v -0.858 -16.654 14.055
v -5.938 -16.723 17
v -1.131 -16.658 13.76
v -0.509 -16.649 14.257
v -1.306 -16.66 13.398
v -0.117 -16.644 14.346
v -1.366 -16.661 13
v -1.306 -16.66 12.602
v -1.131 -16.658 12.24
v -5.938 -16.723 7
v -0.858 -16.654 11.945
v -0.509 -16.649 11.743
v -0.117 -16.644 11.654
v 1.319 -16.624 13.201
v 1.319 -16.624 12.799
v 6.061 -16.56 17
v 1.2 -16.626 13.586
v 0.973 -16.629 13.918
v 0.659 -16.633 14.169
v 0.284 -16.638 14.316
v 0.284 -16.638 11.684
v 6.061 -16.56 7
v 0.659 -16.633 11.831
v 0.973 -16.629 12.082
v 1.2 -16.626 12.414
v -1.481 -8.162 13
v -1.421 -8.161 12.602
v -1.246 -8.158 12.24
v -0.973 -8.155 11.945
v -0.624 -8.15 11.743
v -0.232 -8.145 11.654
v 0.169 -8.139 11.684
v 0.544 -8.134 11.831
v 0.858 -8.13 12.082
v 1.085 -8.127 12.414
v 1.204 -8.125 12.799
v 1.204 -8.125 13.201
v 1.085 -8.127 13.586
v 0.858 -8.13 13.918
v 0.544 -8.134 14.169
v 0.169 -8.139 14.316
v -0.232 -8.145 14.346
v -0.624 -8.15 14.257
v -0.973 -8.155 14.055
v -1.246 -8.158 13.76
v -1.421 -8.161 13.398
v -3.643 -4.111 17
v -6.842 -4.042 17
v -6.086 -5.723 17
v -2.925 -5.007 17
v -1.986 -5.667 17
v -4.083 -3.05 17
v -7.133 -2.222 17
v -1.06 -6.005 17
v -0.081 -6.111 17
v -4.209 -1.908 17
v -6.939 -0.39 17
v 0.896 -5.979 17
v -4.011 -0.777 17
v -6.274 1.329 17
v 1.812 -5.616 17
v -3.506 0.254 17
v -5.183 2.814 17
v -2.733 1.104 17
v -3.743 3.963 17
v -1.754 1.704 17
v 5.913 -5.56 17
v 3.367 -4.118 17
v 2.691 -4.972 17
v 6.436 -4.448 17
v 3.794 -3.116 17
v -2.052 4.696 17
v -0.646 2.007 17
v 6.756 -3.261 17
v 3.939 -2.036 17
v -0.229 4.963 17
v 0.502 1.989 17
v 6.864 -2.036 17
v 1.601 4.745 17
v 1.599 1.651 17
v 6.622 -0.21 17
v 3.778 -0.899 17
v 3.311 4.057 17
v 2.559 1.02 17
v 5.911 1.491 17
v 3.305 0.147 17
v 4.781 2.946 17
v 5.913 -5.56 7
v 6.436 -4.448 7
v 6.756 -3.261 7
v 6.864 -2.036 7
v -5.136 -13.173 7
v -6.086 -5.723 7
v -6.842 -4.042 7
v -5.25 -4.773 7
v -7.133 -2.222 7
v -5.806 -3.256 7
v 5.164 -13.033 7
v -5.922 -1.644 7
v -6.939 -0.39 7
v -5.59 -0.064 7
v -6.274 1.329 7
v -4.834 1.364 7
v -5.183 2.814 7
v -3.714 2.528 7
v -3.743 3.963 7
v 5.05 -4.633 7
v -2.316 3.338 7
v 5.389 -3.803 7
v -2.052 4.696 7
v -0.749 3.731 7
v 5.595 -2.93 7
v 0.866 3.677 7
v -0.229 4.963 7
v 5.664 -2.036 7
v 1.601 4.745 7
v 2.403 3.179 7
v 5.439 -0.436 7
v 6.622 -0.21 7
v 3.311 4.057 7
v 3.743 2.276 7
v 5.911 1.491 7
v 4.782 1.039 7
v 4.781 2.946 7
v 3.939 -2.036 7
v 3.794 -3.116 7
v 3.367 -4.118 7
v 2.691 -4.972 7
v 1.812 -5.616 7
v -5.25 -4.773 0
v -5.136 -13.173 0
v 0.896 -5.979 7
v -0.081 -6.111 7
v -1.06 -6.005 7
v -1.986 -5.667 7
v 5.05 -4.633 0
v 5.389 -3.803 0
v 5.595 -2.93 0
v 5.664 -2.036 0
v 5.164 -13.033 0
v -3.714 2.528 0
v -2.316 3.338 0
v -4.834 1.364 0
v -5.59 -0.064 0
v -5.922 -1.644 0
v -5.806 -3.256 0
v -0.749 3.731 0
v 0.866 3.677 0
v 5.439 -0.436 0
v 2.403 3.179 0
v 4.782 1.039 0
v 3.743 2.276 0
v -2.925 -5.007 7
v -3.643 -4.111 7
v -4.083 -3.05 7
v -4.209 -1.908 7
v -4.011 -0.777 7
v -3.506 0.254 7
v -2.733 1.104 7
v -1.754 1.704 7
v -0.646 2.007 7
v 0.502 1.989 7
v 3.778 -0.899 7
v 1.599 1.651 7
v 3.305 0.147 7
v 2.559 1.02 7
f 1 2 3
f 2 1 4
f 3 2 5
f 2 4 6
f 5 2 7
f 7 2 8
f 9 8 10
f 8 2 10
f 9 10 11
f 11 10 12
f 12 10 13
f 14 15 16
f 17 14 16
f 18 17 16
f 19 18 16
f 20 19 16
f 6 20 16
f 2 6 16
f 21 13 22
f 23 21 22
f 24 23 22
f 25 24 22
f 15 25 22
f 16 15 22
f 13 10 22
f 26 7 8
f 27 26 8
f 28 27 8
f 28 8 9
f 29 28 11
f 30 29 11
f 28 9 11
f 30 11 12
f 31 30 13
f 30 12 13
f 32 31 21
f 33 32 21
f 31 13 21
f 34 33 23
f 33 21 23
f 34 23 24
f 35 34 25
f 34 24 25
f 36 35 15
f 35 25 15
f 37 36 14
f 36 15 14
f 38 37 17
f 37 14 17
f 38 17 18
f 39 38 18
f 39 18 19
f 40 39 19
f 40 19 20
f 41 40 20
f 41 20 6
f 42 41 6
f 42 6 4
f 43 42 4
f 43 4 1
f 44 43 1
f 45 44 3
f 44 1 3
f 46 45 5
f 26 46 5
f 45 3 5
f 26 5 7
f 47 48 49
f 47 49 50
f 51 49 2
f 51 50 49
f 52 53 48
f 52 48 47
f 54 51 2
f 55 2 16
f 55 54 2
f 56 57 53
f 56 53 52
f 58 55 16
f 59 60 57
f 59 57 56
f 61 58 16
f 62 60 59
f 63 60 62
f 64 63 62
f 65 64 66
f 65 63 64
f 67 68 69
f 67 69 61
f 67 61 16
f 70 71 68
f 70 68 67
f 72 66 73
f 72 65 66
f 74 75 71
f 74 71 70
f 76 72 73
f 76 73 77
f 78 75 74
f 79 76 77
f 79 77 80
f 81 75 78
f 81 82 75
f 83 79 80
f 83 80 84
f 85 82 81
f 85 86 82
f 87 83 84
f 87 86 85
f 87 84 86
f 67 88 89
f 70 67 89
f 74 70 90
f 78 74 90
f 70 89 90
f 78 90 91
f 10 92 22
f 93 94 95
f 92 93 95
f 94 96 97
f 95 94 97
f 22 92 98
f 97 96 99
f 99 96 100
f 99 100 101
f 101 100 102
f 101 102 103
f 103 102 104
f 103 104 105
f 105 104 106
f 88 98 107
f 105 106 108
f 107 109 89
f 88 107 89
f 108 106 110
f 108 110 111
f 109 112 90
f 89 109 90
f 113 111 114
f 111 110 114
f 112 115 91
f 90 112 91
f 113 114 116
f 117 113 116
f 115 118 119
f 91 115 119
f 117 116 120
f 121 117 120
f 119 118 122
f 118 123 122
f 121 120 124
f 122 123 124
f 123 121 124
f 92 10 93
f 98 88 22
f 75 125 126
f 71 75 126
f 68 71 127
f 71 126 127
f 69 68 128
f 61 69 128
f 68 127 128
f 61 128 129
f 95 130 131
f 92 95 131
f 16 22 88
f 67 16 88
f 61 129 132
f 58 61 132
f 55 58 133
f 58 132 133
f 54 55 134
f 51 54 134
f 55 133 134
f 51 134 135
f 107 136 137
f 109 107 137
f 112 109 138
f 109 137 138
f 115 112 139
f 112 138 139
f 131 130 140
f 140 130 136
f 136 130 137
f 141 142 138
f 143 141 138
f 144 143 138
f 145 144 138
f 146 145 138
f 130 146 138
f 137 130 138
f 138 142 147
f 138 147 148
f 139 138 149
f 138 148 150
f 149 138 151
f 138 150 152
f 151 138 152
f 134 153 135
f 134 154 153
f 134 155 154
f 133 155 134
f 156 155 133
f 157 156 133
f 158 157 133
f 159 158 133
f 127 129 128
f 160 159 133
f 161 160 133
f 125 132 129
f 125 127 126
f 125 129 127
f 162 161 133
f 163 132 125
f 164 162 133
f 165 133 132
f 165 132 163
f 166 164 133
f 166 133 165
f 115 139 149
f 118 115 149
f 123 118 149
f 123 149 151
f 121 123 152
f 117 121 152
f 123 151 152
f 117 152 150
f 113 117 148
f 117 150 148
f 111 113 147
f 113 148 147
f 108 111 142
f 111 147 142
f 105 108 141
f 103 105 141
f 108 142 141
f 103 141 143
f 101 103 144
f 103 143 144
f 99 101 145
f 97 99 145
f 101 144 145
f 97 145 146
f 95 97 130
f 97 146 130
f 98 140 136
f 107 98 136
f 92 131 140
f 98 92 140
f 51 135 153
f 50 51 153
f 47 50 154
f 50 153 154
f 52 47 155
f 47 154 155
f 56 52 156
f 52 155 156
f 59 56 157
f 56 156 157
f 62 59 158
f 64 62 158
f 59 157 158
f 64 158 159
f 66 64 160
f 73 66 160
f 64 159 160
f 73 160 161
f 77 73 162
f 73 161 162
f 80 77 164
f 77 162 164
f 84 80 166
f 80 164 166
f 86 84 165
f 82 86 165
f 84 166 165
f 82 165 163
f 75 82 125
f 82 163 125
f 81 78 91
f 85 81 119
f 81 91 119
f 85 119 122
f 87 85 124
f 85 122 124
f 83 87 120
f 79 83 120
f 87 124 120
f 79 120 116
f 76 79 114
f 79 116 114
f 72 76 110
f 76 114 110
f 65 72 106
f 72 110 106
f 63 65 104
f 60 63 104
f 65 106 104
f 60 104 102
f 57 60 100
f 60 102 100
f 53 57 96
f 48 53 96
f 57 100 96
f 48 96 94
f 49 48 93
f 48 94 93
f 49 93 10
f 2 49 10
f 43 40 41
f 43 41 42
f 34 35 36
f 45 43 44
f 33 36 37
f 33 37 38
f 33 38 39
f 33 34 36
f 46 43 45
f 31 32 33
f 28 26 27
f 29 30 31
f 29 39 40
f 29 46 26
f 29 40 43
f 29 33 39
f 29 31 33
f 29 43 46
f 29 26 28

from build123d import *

# Parameters (mm, degrees)
BOSS_EXTRUDE1_DEPTH = 7
BOSS_EXTRUDE3_DEPTH = 10
SKETCH6_R           = 1.35
CUT_EXTRUDE3_DEPTH  = 8.5


with BuildPart() as part:
    # Sketch1 → Boss-Extrude1 (new body)
    with BuildSketch(Plane.XY):
        with BuildLine():
            ThreePointArc((5.050452833, -4.633288902), (-0.057176836, -7.835700867), (-5.249547167, -4.77259565))
            Line((-5.249547167, -4.77259565), (-5.135937781, -13.17259565))
            Line((-5.135937781, -13.17259565), (5.164062219, -13.033288902))
            Line((5.164062219, -13.033288902), (5.050452833, -4.633288902))
        make_face()
        with BuildLine():
            ThreePointArc((5.664385761, -2.036231273), (-1.546144107, 3.589638037), (-5.249547167, -4.77259565))
            Line((-5.249547167, -4.77259565), (5.050452833, -4.633288902))
            ThreePointArc((5.050452833, -4.633288902), (5.508816158, -3.370549635), (5.664385761, -2.036231273))
        make_face()
        with BuildLine():
            Line((5.050452833, -4.633288902), (-5.249547167, -4.77259565))
            ThreePointArc((-5.249547167, -4.77259565), (-0.057176836, -7.835700867), (5.050452833, -4.633288902))
        make_face()
    extrude(amount=BOSS_EXTRUDE1_DEPTH)

    # Sketch2 → Boss-Extrude3 (add)
    with BuildSketch(Plane.XY.offset(7)):
        with BuildLine():
            Line((5.063146119, -5.571799449), (5.912597424, -5.560310683))
            ThreePointArc((5.912597424, -5.560310683), (6.622250869, -3.861405013), (6.864385761, -2.036231273))
            ThreePointArc((6.864385761, -2.036231273), (-2.052012342, 4.696332749), (-6.086305185, -5.722594964))
            Line((-6.086305185, -5.722594964), (-5.236853881, -5.711106197))
            Line((-5.236853881, -5.711106197), (-5.249547167, -4.77259565))
            ThreePointArc((-5.249547167, -4.77259565), (-0.214051642, 3.763238321), (5.050452833, -4.633288902))
            Line((5.050452833, -4.633288902), (5.063146119, -5.571799449))
        make_face()
        with BuildLine():
            Line((1.811820806, -5.615773387), (5.063146119, -5.571799449))
            Line((5.063146119, -5.571799449), (5.050452833, -4.633288902))
            ThreePointArc((5.050452833, -4.633288902), (-0.214051642, 3.763238321), (-5.249547167, -4.77259565))
            Line((-5.249547167, -4.77259565), (-5.236853881, -5.711106197))
            Line((-5.236853881, -5.711106197), (-1.985528568, -5.66713226))
            ThreePointArc((-1.985528568, -5.66713226), (-2.264842281, 1.438248968), (3.939385761, -2.036231273))
            ThreePointArc((3.939385761, -2.036231273), (3.367343284, -4.118276805), (1.811820806, -5.615773387))
        make_face()
        with BuildLine():
            Line((5.078495254, -6.706676883), (5.063146119, -5.571799449))
            Line((5.063146119, -5.571799449), (1.811820806, -5.615773387))
            ThreePointArc((1.811820806, -5.615773387), (-0.080505202, -6.110858617), (-1.985528568, -5.66713226))
            Line((-1.985528568, -5.66713226), (-5.236853881, -5.711106197))
            Line((-5.236853881, -5.711106197), (-5.221504746, -6.845983631))
            ThreePointArc((-5.221504746, -6.845983631), (-0.040948408, -9.035591128), (5.078495254, -6.706676883))
        make_face()
        with BuildLine():
            Line((5.164062219, -13.033288902), (5.078495254, -6.706676883))
            ThreePointArc((5.078495254, -6.706676883), (-0.040948408, -9.035591128), (-5.221504746, -6.845983631))
            Line((-5.221504746, -6.845983631), (-5.135937781, -13.17259565))
            Line((-5.135937781, -13.17259565), (5.164062219, -13.033288902))
        make_face()
        with BuildLine():
            Line((6.06137162, -16.560310683), (5.912597424, -5.560310683))
            ThreePointArc((5.912597424, -5.560310683), (5.524642674, -6.154664432), (5.078495254, -6.706676883))
            Line((5.078495254, -6.706676883), (5.164062219, -13.033288902))
            Line((5.164062219, -13.033288902), (-5.135937781, -13.17259565))
            Line((-5.135937781, -13.17259565), (-5.221504746, -6.845983631))
            ThreePointArc((-5.221504746, -6.845983631), (-5.6824181, -6.30623911), (-6.086305185, -5.722594964))
            Line((-6.086305185, -5.722594964), (-5.937530989, -16.722594964))
            Line((-5.937530989, -16.722594964), (6.06137162, -16.560310683))
        make_face()
        with BuildLine():
            ThreePointArc((5.078495254, -6.706676883), (5.524642674, -6.154664432), (5.912597424, -5.560310683))
            Line((5.912597424, -5.560310683), (5.063146119, -5.571799449))
            Line((5.063146119, -5.571799449), (5.078495254, -6.706676883))
        make_face()
        with BuildLine():
            Line((-5.236853881, -5.711106197), (-6.086305185, -5.722594964))
            ThreePointArc((-6.086305185, -5.722594964), (-5.6824181, -6.30623911), (-5.221504746, -6.845983631))
            Line((-5.221504746, -6.845983631), (-5.236853881, -5.711106197))
        make_face()
    extrude(amount=BOSS_EXTRUDE3_DEPTH)

    # Sketch6 → Cut-Extrude3 (cut)
    with BuildSketch(Plane(origin=(0.225044595, -16.639246579, 0), x_dir=(-0.999908551, -0.01352369, 0), z_dir=(0.01352369, -0.999908551, 0))):
        with Locations((0.241163233, -13)):
            Circle(SKETCH6_R)
    extrude(amount=-CUT_EXTRUDE3_DEPTH, mode=Mode.SUBTRACT)


solid = part.part
